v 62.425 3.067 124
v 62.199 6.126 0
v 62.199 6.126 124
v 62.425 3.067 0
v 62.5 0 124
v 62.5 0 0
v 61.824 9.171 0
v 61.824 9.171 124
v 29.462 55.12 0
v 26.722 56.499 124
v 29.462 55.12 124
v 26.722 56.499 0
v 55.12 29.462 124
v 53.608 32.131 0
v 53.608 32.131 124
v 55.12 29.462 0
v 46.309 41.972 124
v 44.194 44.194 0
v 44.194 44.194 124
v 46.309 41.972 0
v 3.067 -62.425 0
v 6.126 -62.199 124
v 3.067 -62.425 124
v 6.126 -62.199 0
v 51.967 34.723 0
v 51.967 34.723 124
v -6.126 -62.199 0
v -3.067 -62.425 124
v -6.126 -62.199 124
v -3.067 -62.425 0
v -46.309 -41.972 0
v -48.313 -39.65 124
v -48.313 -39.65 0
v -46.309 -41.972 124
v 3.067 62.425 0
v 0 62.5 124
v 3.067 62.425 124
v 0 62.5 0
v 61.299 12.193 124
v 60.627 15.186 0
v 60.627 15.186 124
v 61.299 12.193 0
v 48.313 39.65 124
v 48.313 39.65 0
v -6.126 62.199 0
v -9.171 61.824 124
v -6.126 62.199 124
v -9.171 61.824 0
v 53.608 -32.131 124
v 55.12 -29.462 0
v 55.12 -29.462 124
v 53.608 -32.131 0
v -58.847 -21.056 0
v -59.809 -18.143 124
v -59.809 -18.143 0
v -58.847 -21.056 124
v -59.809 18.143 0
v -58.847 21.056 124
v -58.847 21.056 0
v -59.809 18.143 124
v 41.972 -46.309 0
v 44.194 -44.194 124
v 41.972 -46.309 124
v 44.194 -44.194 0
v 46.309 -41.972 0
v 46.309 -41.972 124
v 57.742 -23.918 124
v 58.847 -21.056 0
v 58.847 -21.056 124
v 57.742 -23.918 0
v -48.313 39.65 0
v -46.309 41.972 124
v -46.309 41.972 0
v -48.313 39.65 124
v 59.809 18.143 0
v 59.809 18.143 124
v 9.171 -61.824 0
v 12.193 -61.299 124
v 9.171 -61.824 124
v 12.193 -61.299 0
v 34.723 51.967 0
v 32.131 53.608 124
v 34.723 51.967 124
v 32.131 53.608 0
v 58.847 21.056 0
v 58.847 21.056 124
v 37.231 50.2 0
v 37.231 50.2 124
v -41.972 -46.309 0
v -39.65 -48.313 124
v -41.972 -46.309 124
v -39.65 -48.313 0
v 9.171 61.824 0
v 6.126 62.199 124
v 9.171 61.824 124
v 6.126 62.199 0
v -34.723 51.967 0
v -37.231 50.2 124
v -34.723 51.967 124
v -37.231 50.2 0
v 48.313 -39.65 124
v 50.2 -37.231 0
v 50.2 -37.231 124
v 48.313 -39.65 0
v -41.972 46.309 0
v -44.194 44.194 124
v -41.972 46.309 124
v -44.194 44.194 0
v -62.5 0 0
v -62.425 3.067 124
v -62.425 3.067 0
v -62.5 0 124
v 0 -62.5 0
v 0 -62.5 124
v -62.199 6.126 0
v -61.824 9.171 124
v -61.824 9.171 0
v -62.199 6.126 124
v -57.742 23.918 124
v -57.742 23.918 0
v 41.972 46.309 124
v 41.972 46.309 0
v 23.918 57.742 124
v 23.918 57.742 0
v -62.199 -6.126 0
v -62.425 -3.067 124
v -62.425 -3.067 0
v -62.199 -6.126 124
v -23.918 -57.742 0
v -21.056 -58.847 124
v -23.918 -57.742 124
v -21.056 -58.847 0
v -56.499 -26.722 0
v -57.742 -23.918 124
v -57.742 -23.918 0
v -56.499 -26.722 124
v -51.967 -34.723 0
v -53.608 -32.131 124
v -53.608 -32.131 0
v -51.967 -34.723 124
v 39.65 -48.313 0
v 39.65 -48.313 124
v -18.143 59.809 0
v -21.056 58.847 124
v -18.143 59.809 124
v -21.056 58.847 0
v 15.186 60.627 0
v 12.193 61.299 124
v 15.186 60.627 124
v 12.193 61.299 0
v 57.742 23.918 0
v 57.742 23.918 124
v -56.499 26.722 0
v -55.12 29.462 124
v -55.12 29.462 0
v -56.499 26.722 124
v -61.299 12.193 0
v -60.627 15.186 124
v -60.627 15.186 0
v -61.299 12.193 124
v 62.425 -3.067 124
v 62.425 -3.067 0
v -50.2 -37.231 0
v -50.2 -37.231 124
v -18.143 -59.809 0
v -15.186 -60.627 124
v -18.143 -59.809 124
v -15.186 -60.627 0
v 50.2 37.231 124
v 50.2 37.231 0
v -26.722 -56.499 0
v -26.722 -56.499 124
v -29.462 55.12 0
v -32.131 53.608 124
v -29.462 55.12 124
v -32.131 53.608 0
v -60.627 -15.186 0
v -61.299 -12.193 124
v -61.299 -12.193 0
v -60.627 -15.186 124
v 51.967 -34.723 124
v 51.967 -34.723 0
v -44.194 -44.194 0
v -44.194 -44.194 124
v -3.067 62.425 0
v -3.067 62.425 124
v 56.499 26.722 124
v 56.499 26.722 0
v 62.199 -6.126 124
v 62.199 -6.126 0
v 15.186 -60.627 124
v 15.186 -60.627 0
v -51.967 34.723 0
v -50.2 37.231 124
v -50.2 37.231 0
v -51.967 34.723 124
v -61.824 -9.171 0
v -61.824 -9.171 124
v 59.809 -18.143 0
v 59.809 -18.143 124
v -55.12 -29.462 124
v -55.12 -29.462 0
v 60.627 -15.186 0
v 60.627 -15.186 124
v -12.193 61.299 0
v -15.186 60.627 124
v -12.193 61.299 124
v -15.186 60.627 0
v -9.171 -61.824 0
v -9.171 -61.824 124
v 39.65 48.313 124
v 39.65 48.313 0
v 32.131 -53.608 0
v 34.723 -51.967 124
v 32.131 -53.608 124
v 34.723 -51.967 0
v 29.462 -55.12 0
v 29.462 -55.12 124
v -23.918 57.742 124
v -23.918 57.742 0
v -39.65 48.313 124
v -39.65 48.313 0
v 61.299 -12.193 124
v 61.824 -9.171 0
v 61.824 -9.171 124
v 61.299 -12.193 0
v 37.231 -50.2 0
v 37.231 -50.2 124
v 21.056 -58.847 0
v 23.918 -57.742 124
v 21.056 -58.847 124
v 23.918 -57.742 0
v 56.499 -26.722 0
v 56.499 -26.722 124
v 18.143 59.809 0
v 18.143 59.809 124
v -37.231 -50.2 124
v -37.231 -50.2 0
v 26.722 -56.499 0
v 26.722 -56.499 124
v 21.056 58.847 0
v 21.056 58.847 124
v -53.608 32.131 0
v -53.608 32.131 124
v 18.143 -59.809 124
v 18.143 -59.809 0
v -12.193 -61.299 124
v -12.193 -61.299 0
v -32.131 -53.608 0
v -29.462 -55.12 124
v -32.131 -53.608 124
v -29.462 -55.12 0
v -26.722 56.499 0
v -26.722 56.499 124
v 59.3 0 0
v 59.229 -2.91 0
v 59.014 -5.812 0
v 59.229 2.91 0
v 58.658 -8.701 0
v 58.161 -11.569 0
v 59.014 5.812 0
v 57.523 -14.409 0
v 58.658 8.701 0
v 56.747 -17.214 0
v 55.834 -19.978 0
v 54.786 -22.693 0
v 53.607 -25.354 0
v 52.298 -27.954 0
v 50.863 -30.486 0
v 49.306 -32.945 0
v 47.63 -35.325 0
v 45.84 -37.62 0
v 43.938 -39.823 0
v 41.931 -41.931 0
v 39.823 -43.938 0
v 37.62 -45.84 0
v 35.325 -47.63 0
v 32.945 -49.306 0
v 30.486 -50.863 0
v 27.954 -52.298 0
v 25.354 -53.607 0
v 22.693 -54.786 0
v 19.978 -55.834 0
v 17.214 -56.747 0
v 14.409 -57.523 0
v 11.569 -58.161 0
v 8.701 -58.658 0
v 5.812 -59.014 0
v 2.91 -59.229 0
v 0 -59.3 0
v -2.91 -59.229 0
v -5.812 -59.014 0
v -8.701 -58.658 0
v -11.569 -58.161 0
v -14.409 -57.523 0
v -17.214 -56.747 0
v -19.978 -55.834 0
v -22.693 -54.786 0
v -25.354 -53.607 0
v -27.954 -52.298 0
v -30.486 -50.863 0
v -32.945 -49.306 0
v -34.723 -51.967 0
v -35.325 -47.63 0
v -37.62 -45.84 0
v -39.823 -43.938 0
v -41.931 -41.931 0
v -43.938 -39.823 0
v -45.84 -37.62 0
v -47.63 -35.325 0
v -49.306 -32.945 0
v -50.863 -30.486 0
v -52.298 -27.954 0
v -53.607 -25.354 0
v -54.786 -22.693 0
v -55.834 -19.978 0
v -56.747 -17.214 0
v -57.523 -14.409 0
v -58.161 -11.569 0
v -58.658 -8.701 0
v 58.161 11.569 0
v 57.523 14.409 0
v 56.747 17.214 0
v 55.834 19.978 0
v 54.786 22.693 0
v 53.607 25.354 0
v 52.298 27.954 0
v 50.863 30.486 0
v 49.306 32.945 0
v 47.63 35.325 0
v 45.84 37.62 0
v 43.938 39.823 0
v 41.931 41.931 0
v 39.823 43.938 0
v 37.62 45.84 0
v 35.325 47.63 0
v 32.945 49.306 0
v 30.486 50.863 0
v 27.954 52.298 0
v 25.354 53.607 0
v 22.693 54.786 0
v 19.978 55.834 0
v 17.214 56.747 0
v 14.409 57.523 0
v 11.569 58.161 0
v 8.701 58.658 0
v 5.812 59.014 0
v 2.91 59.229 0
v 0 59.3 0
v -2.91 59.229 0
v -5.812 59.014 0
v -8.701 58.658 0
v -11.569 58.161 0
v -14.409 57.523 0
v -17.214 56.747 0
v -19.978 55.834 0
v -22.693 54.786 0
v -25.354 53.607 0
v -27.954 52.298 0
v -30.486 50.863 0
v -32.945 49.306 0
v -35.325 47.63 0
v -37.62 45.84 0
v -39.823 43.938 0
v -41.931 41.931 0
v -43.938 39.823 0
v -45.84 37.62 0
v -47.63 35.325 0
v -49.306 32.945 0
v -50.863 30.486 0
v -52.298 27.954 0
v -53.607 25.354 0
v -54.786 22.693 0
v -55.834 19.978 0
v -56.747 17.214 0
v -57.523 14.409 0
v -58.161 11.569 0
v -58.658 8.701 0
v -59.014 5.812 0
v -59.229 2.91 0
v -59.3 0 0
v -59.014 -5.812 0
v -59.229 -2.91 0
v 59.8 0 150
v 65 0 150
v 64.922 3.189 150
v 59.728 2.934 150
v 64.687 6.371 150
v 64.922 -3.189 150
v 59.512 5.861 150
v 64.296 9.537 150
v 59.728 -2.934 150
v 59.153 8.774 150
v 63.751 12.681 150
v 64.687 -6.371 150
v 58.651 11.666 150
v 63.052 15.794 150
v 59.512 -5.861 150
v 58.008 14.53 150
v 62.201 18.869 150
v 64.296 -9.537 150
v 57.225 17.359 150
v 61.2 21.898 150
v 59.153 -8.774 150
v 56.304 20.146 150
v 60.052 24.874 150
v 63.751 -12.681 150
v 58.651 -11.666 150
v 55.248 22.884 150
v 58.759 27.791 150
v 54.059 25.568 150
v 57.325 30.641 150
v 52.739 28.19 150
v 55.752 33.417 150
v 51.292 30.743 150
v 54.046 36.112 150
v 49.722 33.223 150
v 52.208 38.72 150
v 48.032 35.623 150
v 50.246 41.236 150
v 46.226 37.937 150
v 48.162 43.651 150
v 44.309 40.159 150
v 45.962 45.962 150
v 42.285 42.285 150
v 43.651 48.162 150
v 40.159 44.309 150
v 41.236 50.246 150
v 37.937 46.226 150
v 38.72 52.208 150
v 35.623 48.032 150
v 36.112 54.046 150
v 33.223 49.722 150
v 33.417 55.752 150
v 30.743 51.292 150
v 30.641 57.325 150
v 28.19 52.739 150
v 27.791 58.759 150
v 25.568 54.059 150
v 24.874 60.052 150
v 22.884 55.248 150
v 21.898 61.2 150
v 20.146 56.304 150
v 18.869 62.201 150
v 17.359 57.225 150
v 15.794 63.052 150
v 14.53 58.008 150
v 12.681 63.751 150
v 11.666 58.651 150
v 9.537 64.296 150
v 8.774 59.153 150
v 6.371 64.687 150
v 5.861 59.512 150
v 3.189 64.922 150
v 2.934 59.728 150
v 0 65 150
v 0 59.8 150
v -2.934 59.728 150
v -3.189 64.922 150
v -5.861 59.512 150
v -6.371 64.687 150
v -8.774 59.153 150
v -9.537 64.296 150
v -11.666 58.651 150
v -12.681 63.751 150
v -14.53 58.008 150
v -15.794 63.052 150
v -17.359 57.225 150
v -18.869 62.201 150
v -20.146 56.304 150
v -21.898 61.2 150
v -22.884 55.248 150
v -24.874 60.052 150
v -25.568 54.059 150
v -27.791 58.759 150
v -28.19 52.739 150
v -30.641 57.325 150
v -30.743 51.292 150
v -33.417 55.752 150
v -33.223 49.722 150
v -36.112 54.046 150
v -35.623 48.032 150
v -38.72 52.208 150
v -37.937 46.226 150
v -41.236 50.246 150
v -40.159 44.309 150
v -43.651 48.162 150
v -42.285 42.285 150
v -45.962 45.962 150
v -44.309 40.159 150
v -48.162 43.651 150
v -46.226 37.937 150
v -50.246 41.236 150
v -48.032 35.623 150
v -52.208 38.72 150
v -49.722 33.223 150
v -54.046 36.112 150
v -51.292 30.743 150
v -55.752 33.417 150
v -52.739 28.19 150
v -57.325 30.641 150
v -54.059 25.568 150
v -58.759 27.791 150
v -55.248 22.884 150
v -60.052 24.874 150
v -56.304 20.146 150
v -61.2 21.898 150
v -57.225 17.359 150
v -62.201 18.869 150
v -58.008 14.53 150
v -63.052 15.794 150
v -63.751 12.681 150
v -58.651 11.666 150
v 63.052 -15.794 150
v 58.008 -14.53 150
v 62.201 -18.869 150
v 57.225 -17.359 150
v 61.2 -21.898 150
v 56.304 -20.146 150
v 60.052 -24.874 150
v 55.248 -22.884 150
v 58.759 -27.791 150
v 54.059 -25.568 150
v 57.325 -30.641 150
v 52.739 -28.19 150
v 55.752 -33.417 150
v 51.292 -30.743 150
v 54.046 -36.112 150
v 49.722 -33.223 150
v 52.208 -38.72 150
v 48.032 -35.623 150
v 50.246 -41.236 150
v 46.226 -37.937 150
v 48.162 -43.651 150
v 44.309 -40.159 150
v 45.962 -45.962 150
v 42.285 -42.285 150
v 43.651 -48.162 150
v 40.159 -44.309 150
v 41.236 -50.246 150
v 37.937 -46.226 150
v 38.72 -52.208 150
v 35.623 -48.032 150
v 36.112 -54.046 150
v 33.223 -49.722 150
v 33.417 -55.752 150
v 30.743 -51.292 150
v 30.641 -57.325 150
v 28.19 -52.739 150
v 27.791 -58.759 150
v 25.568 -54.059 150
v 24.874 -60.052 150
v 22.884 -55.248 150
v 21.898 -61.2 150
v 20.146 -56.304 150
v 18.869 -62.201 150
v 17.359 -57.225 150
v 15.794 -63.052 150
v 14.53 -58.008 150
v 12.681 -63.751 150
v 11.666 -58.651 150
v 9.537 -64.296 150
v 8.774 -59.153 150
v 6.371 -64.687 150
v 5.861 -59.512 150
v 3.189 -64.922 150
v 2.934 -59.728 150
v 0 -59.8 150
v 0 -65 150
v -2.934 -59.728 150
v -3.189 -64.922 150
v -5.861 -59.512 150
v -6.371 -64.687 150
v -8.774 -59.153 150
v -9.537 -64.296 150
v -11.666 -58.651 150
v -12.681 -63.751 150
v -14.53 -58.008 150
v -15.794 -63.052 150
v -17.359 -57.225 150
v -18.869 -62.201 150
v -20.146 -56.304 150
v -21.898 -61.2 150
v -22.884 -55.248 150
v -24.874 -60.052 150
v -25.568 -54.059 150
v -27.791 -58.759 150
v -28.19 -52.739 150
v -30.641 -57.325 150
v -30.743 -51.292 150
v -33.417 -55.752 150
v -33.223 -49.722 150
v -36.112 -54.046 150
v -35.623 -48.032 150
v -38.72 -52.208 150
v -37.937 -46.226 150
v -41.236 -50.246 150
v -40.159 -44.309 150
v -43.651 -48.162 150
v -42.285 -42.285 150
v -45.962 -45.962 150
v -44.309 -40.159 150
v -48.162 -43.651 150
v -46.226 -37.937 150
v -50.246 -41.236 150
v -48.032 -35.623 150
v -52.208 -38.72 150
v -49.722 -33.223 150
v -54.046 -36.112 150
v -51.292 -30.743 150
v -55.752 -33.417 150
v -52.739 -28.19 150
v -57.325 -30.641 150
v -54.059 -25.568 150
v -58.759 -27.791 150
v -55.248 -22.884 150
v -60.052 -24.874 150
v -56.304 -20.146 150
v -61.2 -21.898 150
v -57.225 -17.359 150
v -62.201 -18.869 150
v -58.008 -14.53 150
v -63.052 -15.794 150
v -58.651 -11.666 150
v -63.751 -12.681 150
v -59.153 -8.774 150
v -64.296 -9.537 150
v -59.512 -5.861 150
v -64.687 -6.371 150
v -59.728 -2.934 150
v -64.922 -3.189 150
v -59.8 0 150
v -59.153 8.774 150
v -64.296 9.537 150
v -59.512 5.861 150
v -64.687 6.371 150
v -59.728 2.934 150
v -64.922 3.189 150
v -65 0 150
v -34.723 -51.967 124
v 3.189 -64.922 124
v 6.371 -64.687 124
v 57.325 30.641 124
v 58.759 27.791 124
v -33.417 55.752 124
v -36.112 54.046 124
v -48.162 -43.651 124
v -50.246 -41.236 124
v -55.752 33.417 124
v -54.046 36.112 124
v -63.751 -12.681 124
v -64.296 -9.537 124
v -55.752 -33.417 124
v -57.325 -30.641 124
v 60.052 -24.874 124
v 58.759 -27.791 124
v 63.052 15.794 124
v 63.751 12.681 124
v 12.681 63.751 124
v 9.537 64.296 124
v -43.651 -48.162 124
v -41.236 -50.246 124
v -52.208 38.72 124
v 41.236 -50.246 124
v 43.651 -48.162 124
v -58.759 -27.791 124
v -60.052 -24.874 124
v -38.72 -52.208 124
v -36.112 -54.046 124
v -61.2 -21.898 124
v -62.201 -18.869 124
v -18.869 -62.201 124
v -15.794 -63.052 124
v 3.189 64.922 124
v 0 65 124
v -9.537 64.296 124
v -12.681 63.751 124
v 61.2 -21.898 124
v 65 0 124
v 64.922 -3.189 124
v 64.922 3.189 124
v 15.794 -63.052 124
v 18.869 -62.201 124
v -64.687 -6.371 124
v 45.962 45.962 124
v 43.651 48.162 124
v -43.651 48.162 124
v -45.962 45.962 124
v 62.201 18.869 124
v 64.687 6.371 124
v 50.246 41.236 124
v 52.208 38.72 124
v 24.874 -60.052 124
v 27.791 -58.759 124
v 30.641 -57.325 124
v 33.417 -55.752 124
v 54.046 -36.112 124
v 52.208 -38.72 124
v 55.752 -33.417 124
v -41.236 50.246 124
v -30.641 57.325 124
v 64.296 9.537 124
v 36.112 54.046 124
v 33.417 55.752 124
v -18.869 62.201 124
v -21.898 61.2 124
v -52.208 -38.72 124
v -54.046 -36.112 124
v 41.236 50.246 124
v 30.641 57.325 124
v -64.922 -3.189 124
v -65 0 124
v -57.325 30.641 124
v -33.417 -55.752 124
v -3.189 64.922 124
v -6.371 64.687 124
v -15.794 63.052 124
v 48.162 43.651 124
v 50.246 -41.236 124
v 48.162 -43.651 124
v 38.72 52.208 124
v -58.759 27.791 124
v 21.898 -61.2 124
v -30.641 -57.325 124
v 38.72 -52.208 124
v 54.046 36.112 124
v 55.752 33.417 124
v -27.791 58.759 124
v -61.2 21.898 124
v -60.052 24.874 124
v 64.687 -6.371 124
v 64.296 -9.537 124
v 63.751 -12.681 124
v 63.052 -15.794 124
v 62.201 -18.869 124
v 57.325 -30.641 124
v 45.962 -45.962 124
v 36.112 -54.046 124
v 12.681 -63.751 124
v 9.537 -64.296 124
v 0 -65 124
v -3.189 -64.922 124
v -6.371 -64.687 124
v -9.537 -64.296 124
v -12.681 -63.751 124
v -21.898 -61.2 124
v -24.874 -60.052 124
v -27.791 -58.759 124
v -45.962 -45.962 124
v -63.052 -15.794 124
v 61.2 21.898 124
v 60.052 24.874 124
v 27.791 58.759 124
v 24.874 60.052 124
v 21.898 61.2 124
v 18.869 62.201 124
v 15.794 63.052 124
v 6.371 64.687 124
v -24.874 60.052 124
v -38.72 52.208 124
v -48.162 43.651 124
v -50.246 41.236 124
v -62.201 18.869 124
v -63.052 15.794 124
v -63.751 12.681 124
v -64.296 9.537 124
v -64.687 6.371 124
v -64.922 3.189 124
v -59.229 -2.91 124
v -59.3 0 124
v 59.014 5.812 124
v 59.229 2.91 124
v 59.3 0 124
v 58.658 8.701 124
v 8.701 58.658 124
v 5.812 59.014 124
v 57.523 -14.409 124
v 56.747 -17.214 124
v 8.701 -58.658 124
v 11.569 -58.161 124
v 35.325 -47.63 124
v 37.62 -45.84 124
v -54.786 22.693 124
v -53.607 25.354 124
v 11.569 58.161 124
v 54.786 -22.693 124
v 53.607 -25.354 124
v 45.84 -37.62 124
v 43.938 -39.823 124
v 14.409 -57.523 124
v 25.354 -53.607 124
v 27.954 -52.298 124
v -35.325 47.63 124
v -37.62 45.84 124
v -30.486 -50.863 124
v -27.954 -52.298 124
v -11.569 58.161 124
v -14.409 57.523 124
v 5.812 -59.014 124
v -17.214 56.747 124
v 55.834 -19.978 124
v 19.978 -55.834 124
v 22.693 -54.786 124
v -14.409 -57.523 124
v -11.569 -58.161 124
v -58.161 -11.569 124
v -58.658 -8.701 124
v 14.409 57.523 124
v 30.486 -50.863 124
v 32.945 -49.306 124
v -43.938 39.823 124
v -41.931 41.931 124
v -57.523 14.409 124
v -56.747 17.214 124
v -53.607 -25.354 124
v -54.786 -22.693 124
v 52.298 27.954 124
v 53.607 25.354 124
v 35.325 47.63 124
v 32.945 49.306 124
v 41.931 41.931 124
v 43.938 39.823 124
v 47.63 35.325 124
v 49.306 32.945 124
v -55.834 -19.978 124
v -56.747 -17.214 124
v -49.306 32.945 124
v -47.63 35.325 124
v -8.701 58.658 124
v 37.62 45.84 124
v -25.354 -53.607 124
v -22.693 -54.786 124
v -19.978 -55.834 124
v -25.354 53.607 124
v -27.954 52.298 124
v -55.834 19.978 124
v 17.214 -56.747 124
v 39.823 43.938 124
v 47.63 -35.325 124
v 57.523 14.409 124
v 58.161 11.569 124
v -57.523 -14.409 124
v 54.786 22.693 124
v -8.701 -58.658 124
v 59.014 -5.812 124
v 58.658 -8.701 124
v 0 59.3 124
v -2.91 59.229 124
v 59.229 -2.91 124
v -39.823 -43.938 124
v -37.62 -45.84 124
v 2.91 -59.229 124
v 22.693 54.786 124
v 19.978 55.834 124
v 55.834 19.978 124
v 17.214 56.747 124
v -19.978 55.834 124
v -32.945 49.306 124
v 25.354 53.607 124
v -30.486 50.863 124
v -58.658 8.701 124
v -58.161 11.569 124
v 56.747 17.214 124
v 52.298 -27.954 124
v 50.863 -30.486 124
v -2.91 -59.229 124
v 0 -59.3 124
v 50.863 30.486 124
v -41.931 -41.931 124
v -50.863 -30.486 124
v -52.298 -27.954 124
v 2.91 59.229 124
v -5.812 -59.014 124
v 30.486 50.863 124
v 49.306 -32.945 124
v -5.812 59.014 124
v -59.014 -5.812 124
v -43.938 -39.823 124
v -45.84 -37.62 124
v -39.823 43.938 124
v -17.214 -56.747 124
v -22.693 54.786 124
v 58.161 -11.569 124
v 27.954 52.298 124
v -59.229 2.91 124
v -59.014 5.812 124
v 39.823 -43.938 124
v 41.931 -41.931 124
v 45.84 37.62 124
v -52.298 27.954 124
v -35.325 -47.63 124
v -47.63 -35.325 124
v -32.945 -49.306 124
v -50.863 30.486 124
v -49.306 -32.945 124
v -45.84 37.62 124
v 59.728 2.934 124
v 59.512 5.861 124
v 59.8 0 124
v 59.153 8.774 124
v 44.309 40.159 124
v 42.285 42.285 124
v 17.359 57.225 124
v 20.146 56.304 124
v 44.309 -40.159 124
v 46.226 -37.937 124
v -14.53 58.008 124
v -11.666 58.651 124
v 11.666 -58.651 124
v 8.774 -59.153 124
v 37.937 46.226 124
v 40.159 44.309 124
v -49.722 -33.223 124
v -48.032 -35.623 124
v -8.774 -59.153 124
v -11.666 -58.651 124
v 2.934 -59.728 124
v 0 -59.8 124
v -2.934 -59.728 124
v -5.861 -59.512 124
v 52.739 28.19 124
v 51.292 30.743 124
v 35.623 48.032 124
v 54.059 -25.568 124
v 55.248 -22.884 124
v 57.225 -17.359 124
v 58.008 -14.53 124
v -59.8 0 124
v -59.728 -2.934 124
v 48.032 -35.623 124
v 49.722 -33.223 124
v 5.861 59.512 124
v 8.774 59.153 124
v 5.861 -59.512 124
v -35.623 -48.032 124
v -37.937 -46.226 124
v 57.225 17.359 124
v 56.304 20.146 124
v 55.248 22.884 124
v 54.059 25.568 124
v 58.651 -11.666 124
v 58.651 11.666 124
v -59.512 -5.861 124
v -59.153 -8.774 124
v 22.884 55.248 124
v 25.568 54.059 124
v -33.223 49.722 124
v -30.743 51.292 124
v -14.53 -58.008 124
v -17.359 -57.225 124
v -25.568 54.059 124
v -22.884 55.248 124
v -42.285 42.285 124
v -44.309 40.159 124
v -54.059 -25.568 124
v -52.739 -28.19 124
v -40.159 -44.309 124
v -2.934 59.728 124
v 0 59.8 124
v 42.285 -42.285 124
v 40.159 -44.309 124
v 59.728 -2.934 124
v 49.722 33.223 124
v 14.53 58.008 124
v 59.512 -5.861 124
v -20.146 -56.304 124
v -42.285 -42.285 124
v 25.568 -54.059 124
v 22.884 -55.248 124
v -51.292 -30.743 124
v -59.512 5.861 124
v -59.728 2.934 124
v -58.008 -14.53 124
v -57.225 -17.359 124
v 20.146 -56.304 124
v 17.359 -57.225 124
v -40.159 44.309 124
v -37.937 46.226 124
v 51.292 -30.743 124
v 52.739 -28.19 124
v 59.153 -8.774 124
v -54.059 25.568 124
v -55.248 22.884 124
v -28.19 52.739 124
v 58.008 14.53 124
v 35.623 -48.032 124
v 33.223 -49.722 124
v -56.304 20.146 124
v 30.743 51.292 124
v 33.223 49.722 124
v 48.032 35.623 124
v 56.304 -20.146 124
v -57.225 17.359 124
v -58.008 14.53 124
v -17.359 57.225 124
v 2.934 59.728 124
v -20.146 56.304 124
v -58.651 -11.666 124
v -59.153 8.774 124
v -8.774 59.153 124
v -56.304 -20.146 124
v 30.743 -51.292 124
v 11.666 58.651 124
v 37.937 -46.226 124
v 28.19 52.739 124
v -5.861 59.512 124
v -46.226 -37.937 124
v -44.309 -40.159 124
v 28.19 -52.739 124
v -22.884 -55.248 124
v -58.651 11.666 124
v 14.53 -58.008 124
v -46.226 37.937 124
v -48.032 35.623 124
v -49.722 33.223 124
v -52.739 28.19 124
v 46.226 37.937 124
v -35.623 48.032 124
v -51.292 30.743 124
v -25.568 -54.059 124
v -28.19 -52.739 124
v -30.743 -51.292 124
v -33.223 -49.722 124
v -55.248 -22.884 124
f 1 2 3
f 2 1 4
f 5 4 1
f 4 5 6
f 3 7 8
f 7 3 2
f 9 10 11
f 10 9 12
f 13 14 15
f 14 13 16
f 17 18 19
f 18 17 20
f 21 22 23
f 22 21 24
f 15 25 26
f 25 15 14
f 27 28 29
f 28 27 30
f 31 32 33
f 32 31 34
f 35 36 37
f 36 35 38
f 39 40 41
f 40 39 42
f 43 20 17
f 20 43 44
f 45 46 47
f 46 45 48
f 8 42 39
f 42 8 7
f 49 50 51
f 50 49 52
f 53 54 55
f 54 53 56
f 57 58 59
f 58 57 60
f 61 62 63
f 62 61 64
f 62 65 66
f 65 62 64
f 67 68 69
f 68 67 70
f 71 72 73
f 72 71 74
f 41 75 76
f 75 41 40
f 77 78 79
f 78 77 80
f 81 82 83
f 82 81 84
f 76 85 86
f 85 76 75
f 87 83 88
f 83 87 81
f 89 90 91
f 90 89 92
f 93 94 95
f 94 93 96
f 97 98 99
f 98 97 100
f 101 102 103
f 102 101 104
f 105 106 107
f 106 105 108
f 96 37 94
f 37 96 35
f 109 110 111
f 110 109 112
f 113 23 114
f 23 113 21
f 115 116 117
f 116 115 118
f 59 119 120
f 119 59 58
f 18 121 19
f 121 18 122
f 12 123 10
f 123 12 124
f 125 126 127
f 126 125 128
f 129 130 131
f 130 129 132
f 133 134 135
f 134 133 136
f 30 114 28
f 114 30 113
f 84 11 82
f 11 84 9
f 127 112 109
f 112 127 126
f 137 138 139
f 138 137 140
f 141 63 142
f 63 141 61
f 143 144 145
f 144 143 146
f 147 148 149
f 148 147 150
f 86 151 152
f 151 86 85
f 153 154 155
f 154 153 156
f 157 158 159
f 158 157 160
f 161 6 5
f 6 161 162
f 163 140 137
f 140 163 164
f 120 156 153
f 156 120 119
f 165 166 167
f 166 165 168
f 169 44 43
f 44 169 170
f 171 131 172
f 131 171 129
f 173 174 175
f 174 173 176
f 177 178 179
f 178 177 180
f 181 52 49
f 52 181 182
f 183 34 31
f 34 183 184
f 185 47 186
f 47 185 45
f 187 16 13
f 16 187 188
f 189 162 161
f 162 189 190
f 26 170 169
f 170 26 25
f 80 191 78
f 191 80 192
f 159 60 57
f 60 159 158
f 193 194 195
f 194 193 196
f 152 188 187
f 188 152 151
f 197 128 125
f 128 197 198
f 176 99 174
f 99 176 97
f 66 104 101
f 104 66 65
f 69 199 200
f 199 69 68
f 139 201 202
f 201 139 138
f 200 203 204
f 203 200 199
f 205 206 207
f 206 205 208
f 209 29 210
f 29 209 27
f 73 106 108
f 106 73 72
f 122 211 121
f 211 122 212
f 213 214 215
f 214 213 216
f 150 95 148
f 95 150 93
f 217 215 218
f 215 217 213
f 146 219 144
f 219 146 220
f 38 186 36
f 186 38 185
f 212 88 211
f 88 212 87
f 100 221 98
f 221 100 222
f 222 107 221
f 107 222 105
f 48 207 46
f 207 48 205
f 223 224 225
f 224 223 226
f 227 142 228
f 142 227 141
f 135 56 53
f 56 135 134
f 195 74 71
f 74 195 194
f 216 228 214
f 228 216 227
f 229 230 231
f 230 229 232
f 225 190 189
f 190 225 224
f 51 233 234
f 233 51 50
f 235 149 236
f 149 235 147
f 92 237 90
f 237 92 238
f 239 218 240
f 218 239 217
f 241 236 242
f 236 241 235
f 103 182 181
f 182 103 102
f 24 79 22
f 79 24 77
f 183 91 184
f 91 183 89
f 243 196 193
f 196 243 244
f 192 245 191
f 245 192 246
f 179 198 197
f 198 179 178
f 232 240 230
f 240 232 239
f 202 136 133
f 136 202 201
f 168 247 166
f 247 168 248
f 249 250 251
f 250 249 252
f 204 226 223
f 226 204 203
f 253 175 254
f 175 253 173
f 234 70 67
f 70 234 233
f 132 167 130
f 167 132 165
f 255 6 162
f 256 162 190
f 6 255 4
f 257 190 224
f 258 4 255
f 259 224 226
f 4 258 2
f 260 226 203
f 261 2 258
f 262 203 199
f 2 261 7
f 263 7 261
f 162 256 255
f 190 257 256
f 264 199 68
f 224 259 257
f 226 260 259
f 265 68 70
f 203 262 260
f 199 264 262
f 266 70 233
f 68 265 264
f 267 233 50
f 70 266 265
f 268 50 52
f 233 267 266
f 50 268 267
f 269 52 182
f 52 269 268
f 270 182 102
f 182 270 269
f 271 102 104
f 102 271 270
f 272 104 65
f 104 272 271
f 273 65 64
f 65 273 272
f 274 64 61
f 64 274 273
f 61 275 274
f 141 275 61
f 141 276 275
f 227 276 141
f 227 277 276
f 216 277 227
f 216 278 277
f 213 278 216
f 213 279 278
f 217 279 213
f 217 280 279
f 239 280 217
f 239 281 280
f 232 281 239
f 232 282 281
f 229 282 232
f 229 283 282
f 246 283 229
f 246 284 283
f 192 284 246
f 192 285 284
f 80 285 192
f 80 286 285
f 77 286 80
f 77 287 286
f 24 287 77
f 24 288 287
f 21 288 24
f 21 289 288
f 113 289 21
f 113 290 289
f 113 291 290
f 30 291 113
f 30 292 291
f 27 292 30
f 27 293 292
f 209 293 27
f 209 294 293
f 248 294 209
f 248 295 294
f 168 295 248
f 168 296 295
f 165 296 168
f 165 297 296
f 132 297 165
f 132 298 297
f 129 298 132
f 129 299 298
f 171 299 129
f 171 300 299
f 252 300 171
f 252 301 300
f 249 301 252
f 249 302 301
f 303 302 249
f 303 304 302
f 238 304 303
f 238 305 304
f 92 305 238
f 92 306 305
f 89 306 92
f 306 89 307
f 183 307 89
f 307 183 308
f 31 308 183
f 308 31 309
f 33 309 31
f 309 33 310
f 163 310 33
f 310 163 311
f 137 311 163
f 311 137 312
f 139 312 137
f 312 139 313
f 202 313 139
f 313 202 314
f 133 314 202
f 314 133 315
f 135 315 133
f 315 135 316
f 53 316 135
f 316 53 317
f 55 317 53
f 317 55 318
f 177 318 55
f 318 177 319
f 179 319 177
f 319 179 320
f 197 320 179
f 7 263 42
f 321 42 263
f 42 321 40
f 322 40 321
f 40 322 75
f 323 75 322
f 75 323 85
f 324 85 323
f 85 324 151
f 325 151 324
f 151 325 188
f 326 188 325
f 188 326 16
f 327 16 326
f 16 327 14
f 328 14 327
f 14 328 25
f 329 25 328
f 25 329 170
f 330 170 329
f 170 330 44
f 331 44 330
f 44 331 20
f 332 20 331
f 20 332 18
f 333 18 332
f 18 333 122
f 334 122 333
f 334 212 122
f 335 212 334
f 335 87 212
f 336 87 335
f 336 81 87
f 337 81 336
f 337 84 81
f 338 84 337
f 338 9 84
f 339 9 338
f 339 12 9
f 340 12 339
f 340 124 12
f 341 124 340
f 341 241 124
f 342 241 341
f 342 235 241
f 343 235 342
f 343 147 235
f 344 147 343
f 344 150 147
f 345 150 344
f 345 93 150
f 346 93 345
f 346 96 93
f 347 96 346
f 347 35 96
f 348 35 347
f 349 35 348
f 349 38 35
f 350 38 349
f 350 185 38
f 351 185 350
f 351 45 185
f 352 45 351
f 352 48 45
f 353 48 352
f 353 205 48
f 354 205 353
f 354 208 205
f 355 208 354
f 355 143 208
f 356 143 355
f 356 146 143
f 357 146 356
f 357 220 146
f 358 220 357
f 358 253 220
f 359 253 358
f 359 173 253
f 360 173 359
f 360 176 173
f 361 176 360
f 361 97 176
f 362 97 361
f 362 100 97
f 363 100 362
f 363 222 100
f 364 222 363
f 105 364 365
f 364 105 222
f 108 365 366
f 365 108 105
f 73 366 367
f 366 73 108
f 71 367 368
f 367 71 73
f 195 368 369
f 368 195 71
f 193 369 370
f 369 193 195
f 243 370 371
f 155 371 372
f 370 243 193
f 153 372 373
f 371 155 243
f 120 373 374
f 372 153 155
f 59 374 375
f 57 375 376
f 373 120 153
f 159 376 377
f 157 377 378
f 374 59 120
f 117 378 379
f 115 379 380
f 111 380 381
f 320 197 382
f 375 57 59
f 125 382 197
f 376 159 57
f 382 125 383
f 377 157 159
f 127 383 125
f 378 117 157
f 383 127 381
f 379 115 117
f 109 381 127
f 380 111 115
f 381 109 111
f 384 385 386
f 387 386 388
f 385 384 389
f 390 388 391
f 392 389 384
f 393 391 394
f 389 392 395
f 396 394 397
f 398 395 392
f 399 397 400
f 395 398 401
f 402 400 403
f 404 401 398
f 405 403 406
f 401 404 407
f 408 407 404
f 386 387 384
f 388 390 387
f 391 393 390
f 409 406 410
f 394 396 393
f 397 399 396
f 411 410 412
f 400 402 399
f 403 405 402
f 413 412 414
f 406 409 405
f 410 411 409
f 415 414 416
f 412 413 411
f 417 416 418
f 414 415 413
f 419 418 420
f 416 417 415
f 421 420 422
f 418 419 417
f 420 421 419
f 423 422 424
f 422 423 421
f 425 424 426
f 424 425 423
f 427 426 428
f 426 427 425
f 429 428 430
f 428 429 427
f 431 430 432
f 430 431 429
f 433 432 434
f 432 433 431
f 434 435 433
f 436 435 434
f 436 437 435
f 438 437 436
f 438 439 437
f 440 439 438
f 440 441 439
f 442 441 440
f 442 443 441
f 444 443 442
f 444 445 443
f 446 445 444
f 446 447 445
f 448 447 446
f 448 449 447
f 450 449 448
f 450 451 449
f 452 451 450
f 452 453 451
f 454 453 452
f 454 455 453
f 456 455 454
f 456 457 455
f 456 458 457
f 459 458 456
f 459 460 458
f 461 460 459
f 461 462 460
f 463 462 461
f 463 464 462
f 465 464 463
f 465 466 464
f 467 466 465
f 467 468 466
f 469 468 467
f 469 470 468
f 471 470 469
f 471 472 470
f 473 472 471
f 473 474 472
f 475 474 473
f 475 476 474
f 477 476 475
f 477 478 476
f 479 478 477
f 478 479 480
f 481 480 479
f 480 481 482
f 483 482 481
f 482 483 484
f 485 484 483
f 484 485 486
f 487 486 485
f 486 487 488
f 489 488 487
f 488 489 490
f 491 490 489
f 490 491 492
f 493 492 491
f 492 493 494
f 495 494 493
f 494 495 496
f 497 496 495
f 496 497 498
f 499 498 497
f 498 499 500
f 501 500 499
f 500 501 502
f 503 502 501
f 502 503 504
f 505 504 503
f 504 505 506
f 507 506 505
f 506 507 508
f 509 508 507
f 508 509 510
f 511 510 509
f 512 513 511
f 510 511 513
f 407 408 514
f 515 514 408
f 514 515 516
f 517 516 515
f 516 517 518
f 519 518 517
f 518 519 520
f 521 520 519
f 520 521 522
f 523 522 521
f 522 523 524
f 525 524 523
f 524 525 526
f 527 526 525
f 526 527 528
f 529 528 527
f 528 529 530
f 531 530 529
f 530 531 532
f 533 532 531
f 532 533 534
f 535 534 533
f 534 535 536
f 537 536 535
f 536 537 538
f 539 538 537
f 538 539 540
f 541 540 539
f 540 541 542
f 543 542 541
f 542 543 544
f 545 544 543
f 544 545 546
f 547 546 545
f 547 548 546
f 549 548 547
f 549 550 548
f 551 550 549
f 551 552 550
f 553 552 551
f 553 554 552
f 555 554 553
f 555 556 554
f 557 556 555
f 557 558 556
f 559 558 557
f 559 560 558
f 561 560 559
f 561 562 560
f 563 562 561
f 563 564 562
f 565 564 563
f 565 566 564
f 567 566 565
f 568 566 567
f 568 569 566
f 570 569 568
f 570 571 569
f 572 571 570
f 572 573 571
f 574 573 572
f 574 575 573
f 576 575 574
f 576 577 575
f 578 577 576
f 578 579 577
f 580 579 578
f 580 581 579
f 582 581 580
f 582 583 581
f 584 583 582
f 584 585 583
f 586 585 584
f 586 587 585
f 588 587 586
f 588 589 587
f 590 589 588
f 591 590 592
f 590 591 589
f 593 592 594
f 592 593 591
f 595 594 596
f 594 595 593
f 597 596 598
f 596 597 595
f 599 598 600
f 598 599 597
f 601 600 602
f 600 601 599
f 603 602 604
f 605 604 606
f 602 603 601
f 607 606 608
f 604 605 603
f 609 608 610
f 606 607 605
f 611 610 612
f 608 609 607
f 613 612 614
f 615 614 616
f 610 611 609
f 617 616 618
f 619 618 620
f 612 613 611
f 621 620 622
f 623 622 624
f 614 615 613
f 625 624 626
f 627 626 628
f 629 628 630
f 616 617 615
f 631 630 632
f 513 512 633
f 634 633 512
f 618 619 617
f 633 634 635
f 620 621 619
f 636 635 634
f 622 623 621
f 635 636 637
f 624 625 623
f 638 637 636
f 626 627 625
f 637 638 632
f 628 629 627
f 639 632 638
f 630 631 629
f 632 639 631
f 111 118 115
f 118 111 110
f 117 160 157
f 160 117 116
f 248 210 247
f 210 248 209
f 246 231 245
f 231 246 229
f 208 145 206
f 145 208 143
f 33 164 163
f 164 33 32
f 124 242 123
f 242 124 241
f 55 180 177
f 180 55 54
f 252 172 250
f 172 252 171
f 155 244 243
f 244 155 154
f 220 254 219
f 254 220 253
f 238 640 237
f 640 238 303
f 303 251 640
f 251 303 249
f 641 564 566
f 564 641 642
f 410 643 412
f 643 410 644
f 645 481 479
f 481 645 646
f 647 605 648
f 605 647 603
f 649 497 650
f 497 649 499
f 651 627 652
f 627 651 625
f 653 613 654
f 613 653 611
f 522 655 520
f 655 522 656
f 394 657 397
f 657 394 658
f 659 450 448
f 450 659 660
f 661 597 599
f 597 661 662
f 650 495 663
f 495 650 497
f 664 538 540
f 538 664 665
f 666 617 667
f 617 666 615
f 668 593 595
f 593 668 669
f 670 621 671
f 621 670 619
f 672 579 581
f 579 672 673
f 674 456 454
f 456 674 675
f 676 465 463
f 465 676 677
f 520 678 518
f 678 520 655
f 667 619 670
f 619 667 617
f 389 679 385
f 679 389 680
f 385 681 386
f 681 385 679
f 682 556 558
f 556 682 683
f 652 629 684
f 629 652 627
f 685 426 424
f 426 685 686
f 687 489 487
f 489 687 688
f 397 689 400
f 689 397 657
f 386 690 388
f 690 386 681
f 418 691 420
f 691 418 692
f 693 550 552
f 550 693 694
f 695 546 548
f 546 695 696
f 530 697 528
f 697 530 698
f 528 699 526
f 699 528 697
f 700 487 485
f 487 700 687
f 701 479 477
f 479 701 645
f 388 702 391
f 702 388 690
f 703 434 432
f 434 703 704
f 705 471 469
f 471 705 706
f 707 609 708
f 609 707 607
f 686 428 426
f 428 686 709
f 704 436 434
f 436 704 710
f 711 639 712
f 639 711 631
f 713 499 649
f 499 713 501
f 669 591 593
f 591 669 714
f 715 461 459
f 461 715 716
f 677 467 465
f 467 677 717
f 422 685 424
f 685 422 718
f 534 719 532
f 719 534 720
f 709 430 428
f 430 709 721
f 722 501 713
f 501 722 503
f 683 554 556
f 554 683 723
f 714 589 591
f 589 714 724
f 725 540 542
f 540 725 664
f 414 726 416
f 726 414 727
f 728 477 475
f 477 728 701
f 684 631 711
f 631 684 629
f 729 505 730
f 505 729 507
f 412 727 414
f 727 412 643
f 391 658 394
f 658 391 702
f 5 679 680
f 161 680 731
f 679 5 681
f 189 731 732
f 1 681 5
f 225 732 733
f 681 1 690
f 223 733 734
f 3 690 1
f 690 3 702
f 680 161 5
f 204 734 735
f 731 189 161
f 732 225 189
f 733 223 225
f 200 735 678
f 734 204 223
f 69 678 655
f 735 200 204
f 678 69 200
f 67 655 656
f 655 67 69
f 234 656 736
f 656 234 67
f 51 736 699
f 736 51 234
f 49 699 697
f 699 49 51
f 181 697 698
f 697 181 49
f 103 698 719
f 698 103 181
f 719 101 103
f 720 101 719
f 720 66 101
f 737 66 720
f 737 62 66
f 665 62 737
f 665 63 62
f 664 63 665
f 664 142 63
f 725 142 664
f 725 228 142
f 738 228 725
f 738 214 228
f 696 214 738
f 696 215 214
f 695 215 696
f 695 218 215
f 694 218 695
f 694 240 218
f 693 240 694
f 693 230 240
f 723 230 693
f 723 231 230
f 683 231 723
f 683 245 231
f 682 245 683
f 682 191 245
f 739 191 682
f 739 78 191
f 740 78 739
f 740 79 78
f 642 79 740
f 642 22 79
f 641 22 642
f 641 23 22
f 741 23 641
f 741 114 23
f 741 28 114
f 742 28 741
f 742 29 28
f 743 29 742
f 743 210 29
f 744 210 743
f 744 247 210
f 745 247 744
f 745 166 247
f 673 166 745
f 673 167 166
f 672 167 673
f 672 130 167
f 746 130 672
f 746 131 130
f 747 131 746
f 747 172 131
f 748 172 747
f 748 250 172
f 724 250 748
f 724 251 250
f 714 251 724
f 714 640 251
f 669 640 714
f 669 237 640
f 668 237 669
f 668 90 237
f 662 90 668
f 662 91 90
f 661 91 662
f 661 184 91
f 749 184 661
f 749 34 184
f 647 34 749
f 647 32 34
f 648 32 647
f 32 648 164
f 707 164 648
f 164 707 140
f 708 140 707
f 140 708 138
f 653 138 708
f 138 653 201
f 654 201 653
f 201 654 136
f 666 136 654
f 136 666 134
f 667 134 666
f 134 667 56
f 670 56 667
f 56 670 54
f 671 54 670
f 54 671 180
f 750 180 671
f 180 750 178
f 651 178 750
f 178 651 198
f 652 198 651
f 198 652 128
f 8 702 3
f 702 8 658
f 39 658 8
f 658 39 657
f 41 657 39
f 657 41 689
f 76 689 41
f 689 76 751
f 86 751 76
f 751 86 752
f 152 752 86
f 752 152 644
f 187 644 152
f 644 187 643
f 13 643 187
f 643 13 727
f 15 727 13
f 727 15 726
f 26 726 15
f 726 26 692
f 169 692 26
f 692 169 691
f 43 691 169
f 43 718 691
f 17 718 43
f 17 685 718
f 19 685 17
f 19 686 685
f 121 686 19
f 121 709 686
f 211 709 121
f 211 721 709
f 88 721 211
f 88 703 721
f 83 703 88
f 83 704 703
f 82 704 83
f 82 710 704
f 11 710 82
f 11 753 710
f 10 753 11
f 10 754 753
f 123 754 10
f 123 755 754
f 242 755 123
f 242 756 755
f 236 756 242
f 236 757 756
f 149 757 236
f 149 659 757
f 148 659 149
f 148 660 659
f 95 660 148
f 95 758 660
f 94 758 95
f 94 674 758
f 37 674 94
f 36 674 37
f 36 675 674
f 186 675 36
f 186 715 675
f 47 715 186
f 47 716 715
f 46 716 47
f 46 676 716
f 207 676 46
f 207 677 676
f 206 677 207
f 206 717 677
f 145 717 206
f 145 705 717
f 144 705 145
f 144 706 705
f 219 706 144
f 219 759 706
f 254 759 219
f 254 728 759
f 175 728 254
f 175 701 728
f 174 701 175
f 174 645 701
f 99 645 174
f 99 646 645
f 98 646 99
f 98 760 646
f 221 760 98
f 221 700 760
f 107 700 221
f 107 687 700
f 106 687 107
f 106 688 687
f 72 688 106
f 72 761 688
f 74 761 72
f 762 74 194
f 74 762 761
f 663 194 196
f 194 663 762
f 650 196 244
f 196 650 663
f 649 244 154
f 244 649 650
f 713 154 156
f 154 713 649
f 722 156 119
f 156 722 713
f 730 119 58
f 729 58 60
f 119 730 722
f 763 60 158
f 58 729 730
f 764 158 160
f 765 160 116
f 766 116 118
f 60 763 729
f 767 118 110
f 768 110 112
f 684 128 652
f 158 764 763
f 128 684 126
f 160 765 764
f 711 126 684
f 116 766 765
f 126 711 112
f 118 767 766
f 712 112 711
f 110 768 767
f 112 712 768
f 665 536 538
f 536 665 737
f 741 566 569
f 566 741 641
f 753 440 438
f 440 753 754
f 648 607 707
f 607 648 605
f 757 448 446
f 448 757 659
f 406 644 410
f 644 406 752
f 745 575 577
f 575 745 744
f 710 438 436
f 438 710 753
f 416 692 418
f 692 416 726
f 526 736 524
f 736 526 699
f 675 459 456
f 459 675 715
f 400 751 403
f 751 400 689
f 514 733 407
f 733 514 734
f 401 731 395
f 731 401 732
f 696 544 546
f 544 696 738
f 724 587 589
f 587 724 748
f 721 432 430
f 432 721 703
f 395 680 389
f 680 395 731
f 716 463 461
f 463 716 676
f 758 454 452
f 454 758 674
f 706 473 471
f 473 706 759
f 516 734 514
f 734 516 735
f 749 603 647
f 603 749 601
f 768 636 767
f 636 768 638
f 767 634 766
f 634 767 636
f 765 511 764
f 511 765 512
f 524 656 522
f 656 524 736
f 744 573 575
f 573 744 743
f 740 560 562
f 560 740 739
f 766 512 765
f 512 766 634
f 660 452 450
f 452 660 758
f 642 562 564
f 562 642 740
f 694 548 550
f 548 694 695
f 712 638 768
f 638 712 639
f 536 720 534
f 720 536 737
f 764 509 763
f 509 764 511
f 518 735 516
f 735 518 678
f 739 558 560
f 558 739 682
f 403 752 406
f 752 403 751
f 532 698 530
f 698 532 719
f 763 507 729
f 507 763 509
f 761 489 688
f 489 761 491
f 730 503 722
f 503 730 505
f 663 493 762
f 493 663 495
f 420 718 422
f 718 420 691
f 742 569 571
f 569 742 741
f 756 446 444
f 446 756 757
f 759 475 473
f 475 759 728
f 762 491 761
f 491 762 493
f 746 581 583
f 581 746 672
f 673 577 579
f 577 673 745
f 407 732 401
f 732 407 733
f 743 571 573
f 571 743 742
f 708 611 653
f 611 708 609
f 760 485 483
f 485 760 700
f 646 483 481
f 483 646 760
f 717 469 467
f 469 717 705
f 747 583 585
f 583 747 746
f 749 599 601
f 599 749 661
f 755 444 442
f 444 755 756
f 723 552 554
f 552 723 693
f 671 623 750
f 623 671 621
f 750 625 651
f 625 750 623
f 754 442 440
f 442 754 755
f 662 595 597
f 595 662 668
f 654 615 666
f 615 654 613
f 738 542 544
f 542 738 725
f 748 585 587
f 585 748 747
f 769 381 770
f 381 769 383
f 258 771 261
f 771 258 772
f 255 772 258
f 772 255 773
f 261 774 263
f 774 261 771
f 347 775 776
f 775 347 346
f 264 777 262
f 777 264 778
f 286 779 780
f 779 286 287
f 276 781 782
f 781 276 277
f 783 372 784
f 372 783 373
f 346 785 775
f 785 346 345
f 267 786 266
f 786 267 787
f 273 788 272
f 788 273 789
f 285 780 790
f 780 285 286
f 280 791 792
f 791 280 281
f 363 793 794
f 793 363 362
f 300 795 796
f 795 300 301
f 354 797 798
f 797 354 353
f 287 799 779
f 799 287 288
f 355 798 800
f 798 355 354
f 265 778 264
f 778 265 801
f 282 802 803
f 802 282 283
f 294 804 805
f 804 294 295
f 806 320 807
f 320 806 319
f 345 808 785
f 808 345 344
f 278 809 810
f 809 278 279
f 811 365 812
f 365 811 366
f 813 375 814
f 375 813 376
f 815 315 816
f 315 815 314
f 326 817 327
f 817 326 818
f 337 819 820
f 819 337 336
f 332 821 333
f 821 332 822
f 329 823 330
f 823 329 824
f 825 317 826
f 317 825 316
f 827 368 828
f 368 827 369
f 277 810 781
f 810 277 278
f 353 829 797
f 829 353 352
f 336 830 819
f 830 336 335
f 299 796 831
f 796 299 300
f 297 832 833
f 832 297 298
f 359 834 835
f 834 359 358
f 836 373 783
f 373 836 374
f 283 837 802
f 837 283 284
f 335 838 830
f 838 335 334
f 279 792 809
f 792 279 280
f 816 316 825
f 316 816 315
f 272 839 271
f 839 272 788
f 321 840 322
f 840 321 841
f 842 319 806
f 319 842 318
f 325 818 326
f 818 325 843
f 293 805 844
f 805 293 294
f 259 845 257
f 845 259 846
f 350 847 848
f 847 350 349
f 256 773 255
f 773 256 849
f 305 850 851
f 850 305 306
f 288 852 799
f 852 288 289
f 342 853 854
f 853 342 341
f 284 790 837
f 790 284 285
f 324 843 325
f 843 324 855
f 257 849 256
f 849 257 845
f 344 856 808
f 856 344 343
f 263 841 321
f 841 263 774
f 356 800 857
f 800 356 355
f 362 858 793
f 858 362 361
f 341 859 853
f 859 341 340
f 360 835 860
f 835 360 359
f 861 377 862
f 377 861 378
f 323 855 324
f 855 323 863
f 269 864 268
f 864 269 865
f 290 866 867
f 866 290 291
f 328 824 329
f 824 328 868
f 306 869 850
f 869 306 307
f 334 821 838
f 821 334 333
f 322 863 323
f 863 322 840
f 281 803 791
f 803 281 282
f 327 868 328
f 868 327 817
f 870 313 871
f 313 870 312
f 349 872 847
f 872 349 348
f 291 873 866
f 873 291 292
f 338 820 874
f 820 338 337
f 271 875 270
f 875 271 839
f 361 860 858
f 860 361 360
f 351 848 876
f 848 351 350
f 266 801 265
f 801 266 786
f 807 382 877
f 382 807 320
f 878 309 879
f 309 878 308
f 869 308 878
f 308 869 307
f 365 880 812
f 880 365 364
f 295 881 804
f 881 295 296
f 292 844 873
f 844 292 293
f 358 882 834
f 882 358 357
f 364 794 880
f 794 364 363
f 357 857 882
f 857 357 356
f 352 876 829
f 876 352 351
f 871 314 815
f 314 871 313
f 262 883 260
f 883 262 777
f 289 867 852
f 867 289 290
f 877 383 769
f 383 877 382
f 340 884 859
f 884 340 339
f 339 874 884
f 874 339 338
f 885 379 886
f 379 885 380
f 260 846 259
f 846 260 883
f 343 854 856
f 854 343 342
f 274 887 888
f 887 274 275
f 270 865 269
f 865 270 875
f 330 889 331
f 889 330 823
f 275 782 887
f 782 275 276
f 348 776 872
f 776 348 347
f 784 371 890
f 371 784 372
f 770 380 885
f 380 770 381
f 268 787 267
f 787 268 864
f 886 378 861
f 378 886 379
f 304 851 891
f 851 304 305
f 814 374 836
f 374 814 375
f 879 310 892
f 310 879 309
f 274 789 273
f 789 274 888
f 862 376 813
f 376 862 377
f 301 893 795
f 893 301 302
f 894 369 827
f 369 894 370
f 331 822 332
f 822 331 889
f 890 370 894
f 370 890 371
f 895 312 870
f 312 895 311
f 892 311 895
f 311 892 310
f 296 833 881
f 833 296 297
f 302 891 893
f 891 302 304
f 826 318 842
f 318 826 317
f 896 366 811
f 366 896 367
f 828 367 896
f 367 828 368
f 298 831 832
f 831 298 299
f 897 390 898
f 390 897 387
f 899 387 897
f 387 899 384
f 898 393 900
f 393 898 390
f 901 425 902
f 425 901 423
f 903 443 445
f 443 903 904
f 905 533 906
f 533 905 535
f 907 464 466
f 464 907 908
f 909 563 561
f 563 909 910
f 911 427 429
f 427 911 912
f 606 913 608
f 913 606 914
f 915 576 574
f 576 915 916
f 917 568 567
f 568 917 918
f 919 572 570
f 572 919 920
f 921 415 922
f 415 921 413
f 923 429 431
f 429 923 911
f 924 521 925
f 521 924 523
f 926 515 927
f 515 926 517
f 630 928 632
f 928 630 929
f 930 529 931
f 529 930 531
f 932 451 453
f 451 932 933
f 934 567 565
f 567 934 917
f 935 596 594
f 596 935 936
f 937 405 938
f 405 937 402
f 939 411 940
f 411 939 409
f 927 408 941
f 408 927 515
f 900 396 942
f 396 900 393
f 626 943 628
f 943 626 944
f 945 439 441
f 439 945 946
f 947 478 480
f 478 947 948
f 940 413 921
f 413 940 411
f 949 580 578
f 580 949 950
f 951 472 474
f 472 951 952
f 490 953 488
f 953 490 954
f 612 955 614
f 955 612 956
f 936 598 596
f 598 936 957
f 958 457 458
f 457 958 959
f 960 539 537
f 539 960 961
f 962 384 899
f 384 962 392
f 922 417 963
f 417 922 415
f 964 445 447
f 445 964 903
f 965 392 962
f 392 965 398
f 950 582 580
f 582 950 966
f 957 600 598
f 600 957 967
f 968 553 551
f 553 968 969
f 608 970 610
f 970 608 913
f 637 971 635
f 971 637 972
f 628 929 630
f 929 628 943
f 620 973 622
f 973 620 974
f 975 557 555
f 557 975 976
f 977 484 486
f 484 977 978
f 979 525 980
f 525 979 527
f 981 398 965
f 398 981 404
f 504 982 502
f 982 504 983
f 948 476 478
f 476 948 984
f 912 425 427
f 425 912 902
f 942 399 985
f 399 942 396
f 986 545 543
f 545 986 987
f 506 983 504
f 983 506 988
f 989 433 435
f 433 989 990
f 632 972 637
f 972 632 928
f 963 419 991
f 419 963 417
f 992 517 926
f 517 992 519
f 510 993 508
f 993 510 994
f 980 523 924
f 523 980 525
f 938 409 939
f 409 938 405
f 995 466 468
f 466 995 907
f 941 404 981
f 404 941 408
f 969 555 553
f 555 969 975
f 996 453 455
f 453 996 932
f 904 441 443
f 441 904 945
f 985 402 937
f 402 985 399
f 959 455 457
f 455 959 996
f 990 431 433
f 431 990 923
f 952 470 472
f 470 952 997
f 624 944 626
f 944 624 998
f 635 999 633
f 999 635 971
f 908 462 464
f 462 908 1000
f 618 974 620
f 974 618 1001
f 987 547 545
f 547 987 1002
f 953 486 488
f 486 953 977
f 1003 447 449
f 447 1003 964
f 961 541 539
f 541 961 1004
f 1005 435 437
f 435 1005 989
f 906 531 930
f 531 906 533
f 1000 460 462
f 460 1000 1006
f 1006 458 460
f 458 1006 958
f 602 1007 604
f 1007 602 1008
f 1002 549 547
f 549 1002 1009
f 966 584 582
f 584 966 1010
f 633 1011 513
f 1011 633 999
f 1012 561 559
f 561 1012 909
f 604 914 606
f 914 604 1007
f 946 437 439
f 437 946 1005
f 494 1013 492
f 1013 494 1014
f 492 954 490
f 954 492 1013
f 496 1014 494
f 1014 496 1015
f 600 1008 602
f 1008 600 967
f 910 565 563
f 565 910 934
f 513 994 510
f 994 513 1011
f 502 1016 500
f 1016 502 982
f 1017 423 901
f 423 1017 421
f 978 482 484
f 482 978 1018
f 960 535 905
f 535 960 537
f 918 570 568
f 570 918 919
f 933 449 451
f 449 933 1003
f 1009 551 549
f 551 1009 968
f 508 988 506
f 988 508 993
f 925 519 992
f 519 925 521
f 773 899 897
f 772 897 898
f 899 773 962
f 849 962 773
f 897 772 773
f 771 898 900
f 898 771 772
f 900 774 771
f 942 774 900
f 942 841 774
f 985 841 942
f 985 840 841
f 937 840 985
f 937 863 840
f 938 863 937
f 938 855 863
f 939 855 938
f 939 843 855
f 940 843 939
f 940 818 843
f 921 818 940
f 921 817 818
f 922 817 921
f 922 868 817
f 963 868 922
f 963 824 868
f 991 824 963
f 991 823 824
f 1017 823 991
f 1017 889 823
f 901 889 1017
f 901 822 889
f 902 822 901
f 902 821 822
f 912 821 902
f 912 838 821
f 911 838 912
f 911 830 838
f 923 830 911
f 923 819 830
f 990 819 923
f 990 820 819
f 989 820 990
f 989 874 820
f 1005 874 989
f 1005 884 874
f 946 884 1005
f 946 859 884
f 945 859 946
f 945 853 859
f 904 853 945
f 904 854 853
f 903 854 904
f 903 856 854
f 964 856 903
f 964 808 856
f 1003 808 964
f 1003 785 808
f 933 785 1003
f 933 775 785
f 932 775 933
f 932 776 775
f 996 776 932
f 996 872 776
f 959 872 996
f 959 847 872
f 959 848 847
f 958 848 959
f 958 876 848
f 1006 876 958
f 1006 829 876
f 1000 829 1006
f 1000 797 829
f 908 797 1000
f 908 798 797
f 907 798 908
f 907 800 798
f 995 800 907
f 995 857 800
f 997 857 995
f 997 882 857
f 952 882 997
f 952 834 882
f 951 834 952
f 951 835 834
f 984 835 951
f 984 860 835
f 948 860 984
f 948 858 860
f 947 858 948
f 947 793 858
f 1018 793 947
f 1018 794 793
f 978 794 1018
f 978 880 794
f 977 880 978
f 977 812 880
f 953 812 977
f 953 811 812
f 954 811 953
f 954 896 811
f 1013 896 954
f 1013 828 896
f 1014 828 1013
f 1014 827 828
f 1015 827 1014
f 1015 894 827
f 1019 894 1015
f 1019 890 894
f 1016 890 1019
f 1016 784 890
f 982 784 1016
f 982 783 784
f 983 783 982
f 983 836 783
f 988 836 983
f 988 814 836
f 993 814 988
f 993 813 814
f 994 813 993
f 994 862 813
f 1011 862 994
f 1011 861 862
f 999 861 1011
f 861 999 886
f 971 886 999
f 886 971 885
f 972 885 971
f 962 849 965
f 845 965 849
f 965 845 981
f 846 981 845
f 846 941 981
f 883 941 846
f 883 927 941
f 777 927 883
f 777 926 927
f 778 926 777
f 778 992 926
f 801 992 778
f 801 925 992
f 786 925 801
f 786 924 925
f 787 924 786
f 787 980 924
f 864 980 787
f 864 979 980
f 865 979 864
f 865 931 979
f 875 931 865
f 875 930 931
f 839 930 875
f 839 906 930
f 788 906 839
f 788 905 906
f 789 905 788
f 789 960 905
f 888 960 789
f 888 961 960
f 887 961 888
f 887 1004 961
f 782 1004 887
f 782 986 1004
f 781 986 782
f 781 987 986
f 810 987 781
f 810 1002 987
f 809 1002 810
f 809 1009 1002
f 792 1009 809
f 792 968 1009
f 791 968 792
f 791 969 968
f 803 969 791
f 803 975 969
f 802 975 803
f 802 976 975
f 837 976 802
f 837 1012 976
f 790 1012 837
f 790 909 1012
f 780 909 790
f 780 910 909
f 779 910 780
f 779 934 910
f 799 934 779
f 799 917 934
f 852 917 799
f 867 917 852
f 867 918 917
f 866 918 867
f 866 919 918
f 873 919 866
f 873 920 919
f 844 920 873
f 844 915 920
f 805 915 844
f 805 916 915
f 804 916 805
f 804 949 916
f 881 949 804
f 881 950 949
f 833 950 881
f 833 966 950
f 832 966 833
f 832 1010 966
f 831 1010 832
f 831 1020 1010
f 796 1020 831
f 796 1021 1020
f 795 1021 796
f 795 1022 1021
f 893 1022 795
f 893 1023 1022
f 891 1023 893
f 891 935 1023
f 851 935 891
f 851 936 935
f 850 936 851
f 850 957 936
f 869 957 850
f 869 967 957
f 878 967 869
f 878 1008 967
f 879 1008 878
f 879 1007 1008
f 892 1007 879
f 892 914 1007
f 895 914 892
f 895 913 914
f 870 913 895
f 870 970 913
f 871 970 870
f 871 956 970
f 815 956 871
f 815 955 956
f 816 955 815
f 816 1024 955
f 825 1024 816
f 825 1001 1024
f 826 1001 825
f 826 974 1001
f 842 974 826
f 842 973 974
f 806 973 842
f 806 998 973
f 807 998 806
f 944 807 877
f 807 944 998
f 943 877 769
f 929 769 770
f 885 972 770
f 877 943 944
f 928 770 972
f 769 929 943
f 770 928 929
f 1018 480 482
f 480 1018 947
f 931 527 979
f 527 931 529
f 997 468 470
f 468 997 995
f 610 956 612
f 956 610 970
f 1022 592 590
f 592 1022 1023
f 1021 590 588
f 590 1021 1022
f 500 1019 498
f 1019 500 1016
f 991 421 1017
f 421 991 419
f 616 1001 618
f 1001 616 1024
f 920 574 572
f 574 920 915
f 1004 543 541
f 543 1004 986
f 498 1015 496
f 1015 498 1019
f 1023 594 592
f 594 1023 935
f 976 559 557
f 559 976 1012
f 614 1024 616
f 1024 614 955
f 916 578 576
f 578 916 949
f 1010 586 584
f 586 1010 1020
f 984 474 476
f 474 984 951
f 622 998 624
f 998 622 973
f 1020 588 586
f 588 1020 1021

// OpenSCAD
// Parameters
nominal_size = 125; //[60:250:1]
length_mm = 150; //[75:300:1]
center = 0; //[0:1:1]

ht125_outer_diameter = 125; //[62.5:250:0.5]
ht125_wall_thickness = 3.2; //[1.6:6.4:0.1]

end_fitting_length = 25; //[12.5:50:0.5]
end_fitting_radial_add = 2.5; //[1.0:5.0:0.1]
end_fitting_inner_clearance = 0.5; //[0.2:1.5:0.1]

overlap = 1; //[0.5:2:0.1]
$fn = 128;

module ht_pipe() {
    od = ht125_outer_diameter;
    wt = ht125_wall_thickness;

    main_r = od/2;
    fit_r  = main_r + end_fitting_radial_add;

    // Inner radii (must remain positive)
    main_ir = max(0.01, main_r - wt);
    fit_ir  = max(0.01, main_ir + end_fitting_inner_clearance);

    // Fitting at the top end
    fit_z0 = length_mm - end_fitting_length;

    // Optional centering
    z_shift = (center == 1) ? -length_mm/2 : 0;

    translate([0, 0, z_shift])
    difference() {
        // Outer shell (one connected solid)
        union() {
            cylinder(h=length_mm, r=main_r, center=false);

            // Connected by overlap into main pipe
            translate([0, 0, fit_z0 - overlap])
                cylinder(h=end_fitting_length + overlap, r=fit_r, center=false);
        }

        // Inner void: subtract as two segments to avoid coplanar/zero-thickness issues
        // Segment 1: main bore up to start of fitting
        translate([0, 0, -overlap])
            cylinder(h=fit_z0 + overlap, r=main_ir, center=false);

        // Segment 2: fitting bore (slightly larger clearance)
        translate([0, 0, fit_z0 - overlap])
            cylinder(h=end_fitting_length + 2*overlap, r=fit_ir, center=false);
    }
}

ht_pipe();
